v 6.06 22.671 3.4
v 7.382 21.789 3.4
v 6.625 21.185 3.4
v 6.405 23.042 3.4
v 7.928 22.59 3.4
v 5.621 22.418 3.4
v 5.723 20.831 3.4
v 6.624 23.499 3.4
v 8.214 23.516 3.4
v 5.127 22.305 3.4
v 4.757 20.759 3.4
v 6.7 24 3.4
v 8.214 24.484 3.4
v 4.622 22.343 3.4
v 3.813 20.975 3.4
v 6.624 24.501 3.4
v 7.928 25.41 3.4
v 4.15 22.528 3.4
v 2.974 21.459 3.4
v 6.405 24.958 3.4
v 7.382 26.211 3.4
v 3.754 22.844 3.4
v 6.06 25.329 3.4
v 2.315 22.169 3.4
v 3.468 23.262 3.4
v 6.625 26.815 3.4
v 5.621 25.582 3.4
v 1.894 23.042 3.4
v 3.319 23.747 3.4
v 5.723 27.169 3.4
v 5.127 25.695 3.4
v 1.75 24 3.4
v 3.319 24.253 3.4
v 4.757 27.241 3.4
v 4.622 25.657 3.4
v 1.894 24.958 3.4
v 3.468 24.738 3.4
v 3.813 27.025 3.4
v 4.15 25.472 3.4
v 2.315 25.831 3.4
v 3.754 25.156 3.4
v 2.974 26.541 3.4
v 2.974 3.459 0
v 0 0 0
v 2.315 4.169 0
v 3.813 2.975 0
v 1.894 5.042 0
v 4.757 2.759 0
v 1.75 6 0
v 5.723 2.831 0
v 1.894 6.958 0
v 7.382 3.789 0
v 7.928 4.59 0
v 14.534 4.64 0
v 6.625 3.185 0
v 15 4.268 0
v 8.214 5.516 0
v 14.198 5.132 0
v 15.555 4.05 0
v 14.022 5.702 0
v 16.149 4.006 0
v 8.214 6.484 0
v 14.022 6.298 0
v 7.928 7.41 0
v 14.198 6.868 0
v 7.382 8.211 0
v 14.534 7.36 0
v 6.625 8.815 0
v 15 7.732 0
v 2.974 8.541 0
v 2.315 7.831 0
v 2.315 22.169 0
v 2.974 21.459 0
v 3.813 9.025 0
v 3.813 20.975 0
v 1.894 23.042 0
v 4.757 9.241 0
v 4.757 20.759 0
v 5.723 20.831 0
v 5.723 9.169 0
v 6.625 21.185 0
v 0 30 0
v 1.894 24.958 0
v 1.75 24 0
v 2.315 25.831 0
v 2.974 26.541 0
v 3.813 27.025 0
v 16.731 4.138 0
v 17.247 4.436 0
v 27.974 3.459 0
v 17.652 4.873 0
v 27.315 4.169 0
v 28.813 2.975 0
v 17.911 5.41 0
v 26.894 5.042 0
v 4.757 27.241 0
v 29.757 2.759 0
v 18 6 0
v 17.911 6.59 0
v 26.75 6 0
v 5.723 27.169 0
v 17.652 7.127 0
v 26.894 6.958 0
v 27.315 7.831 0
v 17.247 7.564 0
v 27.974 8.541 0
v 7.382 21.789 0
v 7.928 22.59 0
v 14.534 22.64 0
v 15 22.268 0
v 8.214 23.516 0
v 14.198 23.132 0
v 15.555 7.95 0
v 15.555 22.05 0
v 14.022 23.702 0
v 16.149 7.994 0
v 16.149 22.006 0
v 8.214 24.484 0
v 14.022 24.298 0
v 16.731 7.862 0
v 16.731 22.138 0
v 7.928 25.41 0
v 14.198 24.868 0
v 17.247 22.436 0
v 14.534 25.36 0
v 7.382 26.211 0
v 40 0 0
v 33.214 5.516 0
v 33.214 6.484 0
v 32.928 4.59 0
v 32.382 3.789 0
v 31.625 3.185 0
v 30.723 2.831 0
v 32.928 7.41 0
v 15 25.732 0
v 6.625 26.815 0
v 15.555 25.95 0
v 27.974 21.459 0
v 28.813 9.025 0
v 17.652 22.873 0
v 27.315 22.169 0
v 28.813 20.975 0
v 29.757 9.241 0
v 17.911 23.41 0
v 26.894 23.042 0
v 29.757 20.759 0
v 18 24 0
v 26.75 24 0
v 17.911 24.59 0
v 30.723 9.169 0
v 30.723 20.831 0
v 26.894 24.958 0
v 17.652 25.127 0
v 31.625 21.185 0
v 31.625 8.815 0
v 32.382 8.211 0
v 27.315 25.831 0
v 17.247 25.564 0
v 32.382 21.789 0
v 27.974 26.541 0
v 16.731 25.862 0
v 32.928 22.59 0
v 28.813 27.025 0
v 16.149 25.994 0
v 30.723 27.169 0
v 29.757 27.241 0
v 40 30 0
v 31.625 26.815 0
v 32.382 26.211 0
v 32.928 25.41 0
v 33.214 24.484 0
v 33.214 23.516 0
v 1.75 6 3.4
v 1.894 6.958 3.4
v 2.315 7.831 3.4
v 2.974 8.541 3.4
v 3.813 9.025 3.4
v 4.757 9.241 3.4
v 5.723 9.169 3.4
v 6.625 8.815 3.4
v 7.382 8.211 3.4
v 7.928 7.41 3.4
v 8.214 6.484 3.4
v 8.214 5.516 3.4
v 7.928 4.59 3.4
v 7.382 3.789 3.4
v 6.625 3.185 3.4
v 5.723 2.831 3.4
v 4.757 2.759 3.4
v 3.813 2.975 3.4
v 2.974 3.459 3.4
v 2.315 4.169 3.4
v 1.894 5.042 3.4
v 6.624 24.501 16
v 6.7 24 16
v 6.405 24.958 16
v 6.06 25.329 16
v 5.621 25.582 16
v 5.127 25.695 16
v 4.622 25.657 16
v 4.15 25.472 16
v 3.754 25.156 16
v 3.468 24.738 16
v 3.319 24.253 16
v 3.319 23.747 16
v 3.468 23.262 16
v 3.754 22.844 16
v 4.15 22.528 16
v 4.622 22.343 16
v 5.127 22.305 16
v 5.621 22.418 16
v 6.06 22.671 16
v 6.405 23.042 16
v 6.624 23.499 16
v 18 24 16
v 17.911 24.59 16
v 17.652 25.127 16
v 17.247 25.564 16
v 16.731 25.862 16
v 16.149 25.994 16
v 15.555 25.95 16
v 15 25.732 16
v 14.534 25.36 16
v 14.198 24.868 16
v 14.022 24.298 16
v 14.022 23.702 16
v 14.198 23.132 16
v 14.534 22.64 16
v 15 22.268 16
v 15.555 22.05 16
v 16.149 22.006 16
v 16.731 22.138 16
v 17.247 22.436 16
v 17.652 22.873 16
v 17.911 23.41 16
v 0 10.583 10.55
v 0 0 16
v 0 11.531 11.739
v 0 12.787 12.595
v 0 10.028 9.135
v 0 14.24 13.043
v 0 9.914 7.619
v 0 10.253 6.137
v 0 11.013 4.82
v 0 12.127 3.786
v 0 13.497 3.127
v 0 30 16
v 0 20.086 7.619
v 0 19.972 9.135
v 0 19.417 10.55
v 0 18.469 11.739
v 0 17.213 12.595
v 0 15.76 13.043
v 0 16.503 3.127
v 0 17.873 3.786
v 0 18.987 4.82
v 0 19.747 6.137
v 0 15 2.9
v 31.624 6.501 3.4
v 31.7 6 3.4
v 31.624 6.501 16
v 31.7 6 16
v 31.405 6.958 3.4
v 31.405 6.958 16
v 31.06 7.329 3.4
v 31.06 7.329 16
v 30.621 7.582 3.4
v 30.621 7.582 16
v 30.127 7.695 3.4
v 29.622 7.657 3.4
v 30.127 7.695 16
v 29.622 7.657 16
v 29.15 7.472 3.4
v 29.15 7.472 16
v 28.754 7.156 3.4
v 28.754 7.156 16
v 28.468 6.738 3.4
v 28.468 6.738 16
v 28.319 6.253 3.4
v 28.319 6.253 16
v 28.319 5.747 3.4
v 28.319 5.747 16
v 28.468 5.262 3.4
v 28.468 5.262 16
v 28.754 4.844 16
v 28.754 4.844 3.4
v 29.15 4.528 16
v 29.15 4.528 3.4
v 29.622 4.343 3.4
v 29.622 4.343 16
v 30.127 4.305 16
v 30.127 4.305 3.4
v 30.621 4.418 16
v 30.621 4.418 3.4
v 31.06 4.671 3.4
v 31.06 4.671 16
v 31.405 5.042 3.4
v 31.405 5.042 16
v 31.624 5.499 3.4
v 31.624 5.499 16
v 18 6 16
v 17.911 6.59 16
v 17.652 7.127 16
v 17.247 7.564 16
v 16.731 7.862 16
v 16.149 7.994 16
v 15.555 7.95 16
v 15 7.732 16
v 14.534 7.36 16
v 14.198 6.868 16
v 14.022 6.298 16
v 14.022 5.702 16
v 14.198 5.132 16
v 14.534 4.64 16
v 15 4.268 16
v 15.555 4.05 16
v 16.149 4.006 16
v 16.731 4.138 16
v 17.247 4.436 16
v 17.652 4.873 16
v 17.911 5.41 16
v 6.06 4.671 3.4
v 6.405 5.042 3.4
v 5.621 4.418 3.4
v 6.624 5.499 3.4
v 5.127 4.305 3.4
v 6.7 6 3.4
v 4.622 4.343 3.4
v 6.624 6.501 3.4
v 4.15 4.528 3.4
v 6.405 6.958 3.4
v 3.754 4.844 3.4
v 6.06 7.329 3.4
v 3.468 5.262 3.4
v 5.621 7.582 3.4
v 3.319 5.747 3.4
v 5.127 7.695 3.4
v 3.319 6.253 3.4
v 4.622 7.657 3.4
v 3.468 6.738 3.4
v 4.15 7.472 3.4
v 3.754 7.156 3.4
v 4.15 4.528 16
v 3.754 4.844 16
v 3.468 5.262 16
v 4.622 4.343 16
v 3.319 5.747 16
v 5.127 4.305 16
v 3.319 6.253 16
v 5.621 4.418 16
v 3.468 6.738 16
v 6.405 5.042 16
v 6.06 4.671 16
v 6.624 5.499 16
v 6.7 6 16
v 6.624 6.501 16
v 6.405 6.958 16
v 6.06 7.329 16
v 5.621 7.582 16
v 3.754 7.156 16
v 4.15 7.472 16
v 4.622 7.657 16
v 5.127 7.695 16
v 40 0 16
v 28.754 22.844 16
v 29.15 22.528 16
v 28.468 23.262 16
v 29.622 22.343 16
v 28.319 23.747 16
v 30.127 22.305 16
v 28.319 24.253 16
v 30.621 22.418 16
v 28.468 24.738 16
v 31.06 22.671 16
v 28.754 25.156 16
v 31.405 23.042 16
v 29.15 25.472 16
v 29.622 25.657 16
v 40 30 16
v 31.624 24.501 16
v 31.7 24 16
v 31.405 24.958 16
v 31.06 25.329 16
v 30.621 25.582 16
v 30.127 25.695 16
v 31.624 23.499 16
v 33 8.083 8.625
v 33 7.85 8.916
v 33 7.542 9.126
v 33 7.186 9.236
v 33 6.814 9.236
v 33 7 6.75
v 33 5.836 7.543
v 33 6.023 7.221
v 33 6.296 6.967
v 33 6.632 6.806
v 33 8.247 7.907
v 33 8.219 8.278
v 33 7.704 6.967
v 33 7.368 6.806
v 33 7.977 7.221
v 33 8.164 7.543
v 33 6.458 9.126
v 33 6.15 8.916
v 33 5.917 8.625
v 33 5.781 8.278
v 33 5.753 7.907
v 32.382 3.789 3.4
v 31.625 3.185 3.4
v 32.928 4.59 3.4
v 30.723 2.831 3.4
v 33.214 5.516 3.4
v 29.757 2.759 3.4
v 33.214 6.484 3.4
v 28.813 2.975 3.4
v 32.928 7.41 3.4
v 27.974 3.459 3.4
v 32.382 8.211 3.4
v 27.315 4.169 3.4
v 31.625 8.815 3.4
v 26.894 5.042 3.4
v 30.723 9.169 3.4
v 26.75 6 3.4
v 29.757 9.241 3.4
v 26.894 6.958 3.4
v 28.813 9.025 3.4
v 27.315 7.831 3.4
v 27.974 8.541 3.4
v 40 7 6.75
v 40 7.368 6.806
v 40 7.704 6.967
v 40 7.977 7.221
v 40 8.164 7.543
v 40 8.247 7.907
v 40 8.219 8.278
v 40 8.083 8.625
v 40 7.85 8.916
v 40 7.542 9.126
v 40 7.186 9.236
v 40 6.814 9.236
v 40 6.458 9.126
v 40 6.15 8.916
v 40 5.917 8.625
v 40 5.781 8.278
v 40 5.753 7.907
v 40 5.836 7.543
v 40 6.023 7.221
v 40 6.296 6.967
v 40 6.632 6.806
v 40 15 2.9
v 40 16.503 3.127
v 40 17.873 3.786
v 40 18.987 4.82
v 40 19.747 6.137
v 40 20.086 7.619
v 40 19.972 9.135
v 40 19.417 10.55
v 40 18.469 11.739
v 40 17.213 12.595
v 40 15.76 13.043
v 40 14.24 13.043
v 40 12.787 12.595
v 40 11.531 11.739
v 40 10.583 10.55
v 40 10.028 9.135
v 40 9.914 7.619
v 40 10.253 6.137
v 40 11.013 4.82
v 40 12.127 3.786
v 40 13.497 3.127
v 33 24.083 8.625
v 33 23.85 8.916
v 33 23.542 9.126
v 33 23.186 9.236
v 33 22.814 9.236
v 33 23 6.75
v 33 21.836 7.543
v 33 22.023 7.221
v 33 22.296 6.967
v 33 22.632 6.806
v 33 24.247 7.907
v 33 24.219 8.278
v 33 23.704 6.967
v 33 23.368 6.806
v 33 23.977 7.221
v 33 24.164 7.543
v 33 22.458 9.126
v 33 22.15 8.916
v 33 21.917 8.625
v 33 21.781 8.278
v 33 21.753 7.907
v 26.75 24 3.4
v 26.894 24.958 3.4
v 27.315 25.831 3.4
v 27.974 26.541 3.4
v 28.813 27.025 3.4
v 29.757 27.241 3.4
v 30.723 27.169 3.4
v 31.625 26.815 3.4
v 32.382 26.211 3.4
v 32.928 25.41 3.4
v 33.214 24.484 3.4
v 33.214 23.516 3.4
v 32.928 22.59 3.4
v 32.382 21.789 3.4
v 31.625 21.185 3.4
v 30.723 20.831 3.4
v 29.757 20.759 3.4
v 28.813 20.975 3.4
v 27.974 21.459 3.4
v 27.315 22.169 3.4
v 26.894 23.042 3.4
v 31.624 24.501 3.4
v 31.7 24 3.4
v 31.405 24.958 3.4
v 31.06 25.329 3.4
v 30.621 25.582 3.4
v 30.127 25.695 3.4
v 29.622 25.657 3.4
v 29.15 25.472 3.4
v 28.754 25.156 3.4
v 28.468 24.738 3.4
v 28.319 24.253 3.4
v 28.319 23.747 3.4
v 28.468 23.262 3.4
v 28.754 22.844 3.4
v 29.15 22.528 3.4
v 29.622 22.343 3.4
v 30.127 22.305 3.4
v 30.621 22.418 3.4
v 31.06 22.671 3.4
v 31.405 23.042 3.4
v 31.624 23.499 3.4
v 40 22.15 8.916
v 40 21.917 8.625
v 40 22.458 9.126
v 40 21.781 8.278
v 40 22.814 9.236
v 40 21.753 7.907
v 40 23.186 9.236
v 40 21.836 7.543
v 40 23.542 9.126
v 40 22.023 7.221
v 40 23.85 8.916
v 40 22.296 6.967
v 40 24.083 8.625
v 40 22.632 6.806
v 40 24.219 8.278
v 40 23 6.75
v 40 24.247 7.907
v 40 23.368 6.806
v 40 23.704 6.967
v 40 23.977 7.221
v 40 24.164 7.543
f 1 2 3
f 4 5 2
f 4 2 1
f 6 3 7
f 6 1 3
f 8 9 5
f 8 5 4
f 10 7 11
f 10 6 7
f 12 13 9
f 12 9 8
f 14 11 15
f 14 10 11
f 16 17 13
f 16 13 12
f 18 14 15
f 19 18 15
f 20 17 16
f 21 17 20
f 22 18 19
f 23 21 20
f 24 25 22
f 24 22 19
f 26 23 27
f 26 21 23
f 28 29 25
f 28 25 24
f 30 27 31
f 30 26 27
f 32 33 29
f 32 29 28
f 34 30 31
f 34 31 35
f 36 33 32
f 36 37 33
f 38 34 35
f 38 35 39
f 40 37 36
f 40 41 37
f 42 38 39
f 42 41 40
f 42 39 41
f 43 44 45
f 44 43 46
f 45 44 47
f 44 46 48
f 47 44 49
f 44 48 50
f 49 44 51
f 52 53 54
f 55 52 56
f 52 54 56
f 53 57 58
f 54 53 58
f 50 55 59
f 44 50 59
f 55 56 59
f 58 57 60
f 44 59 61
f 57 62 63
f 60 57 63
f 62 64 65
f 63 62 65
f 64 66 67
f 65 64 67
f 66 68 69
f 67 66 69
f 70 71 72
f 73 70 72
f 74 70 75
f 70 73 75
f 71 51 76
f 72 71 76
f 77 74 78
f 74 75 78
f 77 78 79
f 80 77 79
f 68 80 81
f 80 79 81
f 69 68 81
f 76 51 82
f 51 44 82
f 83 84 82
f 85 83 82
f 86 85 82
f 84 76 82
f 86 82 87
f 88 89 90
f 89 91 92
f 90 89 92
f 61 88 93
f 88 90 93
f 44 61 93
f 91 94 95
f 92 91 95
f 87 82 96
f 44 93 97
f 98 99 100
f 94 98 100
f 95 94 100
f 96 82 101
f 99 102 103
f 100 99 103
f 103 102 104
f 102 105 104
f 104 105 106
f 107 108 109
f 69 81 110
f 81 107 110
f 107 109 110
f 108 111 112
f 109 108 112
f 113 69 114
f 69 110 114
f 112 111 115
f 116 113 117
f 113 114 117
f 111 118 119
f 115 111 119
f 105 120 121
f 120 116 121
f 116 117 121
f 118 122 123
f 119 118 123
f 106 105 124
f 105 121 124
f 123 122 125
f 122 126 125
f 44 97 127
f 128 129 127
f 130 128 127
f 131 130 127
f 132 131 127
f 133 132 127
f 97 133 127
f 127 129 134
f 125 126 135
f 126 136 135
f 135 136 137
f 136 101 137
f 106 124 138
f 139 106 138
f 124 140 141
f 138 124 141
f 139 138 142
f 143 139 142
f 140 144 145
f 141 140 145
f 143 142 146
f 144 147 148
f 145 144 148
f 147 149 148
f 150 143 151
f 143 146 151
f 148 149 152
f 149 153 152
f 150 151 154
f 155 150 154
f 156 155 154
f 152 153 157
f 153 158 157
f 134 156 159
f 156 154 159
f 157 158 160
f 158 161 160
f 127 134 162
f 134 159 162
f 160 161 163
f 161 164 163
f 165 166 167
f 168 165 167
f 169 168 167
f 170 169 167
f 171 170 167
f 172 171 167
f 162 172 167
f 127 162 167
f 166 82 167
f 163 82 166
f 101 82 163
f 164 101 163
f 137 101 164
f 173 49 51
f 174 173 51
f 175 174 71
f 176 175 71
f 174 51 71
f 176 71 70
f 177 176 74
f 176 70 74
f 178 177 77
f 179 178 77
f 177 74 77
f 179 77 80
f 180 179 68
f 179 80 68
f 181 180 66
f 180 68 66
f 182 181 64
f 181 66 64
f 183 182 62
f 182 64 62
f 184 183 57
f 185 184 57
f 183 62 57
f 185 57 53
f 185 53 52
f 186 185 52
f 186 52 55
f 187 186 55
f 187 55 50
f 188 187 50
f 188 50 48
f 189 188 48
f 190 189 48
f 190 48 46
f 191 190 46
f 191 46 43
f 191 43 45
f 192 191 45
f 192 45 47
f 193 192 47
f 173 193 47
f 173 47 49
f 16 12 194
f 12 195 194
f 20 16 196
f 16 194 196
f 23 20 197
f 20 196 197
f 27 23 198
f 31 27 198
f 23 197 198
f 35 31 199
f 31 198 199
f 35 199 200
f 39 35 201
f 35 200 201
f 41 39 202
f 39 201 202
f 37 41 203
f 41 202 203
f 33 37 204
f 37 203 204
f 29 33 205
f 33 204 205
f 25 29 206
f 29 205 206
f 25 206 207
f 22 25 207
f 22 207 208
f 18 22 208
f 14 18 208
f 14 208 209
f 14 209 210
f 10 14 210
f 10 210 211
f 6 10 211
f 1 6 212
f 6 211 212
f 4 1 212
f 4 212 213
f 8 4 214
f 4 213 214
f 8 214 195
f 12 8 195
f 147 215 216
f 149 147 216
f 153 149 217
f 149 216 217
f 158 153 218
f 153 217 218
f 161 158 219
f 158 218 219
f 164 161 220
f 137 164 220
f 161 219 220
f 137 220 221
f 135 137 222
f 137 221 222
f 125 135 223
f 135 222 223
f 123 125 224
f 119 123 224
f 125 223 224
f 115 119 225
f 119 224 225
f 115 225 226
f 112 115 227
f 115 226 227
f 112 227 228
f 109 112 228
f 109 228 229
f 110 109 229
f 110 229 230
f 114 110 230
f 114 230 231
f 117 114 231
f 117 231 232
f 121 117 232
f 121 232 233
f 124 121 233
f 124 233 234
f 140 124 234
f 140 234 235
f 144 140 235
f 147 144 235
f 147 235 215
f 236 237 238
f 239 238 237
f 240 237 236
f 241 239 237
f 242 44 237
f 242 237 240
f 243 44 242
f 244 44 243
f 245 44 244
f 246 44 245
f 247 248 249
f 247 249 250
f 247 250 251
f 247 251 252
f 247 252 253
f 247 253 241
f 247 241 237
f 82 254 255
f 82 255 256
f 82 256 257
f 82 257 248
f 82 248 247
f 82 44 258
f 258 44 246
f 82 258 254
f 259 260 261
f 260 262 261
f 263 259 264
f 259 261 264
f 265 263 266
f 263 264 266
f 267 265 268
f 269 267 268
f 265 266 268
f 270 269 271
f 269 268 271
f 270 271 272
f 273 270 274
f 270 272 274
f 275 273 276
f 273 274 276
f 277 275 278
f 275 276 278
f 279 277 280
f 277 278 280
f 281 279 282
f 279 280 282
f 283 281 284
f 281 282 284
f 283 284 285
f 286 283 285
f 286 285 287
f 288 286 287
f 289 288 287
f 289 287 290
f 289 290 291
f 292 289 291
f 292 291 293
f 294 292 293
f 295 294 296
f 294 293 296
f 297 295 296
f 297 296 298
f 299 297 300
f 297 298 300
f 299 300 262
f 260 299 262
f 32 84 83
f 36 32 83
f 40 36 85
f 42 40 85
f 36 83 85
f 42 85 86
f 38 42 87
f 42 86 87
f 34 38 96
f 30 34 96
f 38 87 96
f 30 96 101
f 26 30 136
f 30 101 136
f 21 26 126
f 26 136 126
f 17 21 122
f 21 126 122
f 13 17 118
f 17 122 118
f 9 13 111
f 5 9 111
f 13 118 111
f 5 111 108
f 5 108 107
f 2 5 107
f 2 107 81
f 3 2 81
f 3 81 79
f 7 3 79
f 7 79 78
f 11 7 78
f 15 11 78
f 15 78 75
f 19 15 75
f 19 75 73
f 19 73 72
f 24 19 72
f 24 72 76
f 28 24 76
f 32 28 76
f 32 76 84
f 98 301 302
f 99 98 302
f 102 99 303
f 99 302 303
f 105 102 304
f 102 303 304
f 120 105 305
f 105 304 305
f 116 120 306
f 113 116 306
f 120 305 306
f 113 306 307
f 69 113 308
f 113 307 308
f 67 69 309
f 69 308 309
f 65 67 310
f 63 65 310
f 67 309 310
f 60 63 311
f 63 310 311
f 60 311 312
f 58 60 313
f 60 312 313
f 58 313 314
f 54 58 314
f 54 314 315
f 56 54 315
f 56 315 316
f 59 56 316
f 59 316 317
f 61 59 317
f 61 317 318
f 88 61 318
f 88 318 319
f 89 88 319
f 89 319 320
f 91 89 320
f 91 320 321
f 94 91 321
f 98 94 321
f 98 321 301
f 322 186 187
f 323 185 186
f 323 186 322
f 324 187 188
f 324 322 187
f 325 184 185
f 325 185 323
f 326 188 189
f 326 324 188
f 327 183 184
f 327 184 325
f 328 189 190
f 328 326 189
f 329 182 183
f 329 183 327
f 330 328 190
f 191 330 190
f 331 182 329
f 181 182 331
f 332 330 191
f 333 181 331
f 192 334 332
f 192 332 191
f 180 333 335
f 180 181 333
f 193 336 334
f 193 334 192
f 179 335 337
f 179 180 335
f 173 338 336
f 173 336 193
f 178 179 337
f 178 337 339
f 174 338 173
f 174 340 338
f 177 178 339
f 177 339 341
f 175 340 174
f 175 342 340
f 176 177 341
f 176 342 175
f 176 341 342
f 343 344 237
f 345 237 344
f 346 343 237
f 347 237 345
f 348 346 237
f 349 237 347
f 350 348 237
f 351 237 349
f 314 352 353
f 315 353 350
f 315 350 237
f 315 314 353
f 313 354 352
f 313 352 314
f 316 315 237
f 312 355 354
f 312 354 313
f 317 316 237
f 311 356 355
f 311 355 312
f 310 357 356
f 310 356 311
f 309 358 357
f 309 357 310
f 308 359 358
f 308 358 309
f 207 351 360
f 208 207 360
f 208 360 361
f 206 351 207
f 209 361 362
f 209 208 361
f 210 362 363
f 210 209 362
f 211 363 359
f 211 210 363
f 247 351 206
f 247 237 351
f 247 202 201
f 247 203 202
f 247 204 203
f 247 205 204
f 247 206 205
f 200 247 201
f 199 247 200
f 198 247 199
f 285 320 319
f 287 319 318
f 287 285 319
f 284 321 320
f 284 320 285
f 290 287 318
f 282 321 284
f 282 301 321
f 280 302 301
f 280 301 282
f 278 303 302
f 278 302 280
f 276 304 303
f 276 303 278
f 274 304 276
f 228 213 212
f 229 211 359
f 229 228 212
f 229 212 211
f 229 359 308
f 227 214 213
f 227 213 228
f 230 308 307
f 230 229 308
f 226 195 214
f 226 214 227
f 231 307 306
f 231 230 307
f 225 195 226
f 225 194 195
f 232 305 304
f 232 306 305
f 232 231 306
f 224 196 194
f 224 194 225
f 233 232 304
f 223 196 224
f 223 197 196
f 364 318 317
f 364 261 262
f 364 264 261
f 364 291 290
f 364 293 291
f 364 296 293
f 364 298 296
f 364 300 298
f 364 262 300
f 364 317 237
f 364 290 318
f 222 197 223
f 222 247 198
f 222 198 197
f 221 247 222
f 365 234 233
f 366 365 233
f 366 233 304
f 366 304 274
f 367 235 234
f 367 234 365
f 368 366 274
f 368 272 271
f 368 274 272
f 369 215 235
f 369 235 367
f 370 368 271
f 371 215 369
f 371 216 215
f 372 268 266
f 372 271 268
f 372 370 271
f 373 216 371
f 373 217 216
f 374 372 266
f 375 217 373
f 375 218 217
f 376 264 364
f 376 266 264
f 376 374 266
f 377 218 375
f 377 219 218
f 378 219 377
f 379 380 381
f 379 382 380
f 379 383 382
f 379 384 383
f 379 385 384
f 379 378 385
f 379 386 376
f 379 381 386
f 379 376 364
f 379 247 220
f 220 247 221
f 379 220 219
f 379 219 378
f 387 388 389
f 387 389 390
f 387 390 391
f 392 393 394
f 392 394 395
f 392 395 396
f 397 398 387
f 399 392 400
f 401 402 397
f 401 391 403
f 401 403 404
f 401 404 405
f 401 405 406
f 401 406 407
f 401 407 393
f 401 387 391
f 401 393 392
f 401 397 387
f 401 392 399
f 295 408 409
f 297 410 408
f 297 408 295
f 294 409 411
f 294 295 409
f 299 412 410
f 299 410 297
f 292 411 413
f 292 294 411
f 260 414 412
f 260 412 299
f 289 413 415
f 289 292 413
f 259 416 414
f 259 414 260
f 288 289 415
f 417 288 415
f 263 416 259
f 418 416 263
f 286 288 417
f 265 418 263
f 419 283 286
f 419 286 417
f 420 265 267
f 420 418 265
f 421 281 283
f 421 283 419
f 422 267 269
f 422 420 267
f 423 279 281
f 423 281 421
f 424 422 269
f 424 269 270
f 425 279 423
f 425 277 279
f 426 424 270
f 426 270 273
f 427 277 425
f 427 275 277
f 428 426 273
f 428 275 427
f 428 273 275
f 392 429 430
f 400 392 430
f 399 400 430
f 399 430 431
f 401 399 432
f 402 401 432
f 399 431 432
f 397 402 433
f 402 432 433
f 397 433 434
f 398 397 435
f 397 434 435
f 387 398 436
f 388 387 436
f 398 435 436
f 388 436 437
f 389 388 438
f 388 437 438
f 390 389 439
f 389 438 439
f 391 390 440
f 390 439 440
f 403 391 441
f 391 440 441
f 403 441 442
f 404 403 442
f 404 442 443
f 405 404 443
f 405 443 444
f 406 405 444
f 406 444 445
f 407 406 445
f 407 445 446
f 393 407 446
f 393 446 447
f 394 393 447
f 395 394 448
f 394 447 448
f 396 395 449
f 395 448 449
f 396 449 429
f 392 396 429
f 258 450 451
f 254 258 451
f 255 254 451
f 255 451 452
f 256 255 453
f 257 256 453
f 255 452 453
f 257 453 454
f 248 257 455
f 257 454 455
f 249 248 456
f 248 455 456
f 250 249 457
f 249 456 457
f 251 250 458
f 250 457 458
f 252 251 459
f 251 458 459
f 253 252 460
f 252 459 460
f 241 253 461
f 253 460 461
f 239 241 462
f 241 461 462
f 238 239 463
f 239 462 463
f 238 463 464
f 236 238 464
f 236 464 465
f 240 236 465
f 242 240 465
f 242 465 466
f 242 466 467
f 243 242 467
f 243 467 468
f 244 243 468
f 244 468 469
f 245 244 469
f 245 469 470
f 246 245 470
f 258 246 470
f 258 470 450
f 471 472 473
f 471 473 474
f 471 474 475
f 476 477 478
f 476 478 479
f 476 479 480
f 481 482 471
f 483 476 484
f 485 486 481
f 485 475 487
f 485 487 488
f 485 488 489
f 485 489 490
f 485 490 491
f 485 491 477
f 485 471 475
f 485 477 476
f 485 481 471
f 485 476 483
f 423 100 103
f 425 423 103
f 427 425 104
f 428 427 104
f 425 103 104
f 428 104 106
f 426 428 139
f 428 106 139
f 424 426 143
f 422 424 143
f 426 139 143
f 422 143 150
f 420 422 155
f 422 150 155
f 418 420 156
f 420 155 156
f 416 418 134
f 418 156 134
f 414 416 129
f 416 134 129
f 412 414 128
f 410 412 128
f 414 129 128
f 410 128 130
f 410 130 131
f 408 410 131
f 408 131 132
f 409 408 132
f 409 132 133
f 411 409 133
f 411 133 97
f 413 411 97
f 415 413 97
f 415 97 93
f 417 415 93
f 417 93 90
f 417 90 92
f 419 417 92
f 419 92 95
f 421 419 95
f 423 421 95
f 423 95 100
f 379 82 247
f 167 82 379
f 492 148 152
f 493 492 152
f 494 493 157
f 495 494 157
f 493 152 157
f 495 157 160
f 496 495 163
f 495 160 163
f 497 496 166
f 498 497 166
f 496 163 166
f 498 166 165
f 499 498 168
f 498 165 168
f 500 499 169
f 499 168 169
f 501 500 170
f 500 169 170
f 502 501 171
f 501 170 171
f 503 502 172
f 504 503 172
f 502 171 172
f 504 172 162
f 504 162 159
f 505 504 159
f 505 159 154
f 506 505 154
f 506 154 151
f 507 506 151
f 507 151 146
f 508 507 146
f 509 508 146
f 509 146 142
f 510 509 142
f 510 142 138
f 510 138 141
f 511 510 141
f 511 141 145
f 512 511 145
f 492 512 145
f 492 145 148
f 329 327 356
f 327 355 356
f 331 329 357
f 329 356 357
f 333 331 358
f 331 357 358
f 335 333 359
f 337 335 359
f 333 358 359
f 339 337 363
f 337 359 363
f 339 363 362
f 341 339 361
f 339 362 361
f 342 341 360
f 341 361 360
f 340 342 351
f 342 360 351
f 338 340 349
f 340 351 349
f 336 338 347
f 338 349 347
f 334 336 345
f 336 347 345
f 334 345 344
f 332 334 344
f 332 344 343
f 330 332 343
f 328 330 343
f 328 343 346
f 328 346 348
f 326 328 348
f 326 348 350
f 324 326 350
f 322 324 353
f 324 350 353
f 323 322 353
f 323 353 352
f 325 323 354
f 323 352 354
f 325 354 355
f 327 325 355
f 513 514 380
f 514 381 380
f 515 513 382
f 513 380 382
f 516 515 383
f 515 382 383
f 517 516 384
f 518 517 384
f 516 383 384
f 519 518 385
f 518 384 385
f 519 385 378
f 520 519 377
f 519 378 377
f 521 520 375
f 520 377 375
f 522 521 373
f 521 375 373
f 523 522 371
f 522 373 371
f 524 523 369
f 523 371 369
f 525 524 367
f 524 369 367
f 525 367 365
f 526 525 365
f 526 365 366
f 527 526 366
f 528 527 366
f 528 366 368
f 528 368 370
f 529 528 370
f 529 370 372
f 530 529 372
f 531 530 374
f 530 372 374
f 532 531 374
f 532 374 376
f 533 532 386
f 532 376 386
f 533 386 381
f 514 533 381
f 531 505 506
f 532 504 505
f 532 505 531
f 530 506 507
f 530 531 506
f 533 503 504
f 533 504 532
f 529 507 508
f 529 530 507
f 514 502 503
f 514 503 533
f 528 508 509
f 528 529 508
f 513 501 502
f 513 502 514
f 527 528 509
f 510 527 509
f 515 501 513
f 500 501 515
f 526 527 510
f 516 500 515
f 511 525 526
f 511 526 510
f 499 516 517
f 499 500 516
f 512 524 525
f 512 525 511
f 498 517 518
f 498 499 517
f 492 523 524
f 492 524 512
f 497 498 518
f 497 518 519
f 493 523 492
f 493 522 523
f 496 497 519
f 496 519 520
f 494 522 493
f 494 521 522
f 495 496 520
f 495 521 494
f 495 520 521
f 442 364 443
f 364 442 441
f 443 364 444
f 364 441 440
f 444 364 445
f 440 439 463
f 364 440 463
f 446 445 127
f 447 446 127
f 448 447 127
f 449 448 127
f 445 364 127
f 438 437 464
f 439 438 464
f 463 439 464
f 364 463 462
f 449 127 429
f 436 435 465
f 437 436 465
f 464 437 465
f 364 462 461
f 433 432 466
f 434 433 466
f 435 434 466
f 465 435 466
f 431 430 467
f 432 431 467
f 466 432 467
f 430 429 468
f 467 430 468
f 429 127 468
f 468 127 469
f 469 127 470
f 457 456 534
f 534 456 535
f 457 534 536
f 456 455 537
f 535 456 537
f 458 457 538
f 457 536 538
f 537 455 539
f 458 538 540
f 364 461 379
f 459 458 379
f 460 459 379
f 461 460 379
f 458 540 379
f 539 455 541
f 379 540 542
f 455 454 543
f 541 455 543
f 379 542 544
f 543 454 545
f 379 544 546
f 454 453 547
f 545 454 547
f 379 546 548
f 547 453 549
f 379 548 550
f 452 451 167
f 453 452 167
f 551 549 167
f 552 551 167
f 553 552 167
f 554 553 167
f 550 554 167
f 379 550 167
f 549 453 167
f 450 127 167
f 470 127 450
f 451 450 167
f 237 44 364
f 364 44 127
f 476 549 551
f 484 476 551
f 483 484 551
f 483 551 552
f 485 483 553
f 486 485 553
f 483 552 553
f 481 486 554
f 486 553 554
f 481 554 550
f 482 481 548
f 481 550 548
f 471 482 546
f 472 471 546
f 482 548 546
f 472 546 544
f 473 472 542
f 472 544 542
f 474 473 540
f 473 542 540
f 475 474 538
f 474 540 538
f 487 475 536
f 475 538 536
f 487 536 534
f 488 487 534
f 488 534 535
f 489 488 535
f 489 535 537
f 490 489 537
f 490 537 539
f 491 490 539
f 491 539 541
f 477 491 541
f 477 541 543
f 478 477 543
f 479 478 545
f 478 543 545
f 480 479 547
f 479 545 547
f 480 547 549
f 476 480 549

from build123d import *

# Parameters (mm, degrees)
CROQUIS1_W                                           = 40
CROQUIS1_H                                           = 30
SALIENTE_EXTRUIR1_DEPTH                              = 16
CROQUIS2_R                                           = 5.1
CORTAR_EXTRUIR1_DEPTH                                = 41
REFRENTADO_PARA_TORNILLO_CON_CABEZA_HUEC_D           = 3.4
REFRENTADO_PARA_TORNILLO_CON_CABEZA_HUEC_CBORE_D     = 6.5
REFRENTADO_PARA_TORNILLO_CON_CABEZA_HUEC_CBORE_DEPTH = 3.4
DI_METRO_DE_TALADRO_4_0_4_1_D                        = 4
CROQUIS7_R                                           = 1.25
CORTAR_EXTRUIR2_DEPTH                                = 7


with BuildPart() as part:
    # Croquis1 → Saliente-Extruir1 (new body)
    with BuildSketch(Plane.XY):
        with Locations((20, 15)):
            Rectangle(CROQUIS1_W, CROQUIS1_H)
    extrude(amount=SALIENTE_EXTRUIR1_DEPTH)

    # Croquis2 → Cortar-Extruir1 (cut, through all)
    with BuildSketch(Plane(origin=(40, 0, 0), x_dir=(0, 0, -1), z_dir=(1, 0, 0))):
        with Locations((-8, 15)):
            Circle(CROQUIS2_R)
    extrude(amount=-CORTAR_EXTRUIR1_DEPTH, mode=Mode.SUBTRACT)

    # Refrentado para tornillo con cabeza hueca de M31 (through all)
    with Locations(Plane(origin=(0, 0, 0), x_dir=(-1, 0, 0), z_dir=(0, 0, -1))):
        with Locations((-5, 6), (-30, 6), (-30, 24), (-5, 24)):
            CounterBoreHole(REFRENTADO_PARA_TORNILLO_CON_CABEZA_HUEC_D / 2, REFRENTADO_PARA_TORNILLO_CON_CABEZA_HUEC_CBORE_D / 2, REFRENTADO_PARA_TORNILLO_CON_CABEZA_HUEC_CBORE_DEPTH)

    # Diámetro de taladro Ø4.0 (4)1 (through all)
    with Locations(Plane(origin=(0, 0, 0), x_dir=(-1, 0, 0), z_dir=(0, 0, -1))):
        with Locations((-16, 6), (-16, 24)):
            Hole(DI_METRO_DE_TALADRO_4_0_4_1_D / 2)

    # Croquis7 → Cortar-Extruir2 (cut)
    with BuildSketch(Plane(origin=(40, 0, 0), x_dir=(0, 0, -1), z_dir=(1, 0, 0))):
        with Locations((-8, 23)):
            Circle(CROQUIS7_R)
        with Locations((-8, 7)):
            Circle(CROQUIS7_R)
    extrude(amount=-CORTAR_EXTRUIR2_DEPTH, mode=Mode.SUBTRACT)


solid = part.part
